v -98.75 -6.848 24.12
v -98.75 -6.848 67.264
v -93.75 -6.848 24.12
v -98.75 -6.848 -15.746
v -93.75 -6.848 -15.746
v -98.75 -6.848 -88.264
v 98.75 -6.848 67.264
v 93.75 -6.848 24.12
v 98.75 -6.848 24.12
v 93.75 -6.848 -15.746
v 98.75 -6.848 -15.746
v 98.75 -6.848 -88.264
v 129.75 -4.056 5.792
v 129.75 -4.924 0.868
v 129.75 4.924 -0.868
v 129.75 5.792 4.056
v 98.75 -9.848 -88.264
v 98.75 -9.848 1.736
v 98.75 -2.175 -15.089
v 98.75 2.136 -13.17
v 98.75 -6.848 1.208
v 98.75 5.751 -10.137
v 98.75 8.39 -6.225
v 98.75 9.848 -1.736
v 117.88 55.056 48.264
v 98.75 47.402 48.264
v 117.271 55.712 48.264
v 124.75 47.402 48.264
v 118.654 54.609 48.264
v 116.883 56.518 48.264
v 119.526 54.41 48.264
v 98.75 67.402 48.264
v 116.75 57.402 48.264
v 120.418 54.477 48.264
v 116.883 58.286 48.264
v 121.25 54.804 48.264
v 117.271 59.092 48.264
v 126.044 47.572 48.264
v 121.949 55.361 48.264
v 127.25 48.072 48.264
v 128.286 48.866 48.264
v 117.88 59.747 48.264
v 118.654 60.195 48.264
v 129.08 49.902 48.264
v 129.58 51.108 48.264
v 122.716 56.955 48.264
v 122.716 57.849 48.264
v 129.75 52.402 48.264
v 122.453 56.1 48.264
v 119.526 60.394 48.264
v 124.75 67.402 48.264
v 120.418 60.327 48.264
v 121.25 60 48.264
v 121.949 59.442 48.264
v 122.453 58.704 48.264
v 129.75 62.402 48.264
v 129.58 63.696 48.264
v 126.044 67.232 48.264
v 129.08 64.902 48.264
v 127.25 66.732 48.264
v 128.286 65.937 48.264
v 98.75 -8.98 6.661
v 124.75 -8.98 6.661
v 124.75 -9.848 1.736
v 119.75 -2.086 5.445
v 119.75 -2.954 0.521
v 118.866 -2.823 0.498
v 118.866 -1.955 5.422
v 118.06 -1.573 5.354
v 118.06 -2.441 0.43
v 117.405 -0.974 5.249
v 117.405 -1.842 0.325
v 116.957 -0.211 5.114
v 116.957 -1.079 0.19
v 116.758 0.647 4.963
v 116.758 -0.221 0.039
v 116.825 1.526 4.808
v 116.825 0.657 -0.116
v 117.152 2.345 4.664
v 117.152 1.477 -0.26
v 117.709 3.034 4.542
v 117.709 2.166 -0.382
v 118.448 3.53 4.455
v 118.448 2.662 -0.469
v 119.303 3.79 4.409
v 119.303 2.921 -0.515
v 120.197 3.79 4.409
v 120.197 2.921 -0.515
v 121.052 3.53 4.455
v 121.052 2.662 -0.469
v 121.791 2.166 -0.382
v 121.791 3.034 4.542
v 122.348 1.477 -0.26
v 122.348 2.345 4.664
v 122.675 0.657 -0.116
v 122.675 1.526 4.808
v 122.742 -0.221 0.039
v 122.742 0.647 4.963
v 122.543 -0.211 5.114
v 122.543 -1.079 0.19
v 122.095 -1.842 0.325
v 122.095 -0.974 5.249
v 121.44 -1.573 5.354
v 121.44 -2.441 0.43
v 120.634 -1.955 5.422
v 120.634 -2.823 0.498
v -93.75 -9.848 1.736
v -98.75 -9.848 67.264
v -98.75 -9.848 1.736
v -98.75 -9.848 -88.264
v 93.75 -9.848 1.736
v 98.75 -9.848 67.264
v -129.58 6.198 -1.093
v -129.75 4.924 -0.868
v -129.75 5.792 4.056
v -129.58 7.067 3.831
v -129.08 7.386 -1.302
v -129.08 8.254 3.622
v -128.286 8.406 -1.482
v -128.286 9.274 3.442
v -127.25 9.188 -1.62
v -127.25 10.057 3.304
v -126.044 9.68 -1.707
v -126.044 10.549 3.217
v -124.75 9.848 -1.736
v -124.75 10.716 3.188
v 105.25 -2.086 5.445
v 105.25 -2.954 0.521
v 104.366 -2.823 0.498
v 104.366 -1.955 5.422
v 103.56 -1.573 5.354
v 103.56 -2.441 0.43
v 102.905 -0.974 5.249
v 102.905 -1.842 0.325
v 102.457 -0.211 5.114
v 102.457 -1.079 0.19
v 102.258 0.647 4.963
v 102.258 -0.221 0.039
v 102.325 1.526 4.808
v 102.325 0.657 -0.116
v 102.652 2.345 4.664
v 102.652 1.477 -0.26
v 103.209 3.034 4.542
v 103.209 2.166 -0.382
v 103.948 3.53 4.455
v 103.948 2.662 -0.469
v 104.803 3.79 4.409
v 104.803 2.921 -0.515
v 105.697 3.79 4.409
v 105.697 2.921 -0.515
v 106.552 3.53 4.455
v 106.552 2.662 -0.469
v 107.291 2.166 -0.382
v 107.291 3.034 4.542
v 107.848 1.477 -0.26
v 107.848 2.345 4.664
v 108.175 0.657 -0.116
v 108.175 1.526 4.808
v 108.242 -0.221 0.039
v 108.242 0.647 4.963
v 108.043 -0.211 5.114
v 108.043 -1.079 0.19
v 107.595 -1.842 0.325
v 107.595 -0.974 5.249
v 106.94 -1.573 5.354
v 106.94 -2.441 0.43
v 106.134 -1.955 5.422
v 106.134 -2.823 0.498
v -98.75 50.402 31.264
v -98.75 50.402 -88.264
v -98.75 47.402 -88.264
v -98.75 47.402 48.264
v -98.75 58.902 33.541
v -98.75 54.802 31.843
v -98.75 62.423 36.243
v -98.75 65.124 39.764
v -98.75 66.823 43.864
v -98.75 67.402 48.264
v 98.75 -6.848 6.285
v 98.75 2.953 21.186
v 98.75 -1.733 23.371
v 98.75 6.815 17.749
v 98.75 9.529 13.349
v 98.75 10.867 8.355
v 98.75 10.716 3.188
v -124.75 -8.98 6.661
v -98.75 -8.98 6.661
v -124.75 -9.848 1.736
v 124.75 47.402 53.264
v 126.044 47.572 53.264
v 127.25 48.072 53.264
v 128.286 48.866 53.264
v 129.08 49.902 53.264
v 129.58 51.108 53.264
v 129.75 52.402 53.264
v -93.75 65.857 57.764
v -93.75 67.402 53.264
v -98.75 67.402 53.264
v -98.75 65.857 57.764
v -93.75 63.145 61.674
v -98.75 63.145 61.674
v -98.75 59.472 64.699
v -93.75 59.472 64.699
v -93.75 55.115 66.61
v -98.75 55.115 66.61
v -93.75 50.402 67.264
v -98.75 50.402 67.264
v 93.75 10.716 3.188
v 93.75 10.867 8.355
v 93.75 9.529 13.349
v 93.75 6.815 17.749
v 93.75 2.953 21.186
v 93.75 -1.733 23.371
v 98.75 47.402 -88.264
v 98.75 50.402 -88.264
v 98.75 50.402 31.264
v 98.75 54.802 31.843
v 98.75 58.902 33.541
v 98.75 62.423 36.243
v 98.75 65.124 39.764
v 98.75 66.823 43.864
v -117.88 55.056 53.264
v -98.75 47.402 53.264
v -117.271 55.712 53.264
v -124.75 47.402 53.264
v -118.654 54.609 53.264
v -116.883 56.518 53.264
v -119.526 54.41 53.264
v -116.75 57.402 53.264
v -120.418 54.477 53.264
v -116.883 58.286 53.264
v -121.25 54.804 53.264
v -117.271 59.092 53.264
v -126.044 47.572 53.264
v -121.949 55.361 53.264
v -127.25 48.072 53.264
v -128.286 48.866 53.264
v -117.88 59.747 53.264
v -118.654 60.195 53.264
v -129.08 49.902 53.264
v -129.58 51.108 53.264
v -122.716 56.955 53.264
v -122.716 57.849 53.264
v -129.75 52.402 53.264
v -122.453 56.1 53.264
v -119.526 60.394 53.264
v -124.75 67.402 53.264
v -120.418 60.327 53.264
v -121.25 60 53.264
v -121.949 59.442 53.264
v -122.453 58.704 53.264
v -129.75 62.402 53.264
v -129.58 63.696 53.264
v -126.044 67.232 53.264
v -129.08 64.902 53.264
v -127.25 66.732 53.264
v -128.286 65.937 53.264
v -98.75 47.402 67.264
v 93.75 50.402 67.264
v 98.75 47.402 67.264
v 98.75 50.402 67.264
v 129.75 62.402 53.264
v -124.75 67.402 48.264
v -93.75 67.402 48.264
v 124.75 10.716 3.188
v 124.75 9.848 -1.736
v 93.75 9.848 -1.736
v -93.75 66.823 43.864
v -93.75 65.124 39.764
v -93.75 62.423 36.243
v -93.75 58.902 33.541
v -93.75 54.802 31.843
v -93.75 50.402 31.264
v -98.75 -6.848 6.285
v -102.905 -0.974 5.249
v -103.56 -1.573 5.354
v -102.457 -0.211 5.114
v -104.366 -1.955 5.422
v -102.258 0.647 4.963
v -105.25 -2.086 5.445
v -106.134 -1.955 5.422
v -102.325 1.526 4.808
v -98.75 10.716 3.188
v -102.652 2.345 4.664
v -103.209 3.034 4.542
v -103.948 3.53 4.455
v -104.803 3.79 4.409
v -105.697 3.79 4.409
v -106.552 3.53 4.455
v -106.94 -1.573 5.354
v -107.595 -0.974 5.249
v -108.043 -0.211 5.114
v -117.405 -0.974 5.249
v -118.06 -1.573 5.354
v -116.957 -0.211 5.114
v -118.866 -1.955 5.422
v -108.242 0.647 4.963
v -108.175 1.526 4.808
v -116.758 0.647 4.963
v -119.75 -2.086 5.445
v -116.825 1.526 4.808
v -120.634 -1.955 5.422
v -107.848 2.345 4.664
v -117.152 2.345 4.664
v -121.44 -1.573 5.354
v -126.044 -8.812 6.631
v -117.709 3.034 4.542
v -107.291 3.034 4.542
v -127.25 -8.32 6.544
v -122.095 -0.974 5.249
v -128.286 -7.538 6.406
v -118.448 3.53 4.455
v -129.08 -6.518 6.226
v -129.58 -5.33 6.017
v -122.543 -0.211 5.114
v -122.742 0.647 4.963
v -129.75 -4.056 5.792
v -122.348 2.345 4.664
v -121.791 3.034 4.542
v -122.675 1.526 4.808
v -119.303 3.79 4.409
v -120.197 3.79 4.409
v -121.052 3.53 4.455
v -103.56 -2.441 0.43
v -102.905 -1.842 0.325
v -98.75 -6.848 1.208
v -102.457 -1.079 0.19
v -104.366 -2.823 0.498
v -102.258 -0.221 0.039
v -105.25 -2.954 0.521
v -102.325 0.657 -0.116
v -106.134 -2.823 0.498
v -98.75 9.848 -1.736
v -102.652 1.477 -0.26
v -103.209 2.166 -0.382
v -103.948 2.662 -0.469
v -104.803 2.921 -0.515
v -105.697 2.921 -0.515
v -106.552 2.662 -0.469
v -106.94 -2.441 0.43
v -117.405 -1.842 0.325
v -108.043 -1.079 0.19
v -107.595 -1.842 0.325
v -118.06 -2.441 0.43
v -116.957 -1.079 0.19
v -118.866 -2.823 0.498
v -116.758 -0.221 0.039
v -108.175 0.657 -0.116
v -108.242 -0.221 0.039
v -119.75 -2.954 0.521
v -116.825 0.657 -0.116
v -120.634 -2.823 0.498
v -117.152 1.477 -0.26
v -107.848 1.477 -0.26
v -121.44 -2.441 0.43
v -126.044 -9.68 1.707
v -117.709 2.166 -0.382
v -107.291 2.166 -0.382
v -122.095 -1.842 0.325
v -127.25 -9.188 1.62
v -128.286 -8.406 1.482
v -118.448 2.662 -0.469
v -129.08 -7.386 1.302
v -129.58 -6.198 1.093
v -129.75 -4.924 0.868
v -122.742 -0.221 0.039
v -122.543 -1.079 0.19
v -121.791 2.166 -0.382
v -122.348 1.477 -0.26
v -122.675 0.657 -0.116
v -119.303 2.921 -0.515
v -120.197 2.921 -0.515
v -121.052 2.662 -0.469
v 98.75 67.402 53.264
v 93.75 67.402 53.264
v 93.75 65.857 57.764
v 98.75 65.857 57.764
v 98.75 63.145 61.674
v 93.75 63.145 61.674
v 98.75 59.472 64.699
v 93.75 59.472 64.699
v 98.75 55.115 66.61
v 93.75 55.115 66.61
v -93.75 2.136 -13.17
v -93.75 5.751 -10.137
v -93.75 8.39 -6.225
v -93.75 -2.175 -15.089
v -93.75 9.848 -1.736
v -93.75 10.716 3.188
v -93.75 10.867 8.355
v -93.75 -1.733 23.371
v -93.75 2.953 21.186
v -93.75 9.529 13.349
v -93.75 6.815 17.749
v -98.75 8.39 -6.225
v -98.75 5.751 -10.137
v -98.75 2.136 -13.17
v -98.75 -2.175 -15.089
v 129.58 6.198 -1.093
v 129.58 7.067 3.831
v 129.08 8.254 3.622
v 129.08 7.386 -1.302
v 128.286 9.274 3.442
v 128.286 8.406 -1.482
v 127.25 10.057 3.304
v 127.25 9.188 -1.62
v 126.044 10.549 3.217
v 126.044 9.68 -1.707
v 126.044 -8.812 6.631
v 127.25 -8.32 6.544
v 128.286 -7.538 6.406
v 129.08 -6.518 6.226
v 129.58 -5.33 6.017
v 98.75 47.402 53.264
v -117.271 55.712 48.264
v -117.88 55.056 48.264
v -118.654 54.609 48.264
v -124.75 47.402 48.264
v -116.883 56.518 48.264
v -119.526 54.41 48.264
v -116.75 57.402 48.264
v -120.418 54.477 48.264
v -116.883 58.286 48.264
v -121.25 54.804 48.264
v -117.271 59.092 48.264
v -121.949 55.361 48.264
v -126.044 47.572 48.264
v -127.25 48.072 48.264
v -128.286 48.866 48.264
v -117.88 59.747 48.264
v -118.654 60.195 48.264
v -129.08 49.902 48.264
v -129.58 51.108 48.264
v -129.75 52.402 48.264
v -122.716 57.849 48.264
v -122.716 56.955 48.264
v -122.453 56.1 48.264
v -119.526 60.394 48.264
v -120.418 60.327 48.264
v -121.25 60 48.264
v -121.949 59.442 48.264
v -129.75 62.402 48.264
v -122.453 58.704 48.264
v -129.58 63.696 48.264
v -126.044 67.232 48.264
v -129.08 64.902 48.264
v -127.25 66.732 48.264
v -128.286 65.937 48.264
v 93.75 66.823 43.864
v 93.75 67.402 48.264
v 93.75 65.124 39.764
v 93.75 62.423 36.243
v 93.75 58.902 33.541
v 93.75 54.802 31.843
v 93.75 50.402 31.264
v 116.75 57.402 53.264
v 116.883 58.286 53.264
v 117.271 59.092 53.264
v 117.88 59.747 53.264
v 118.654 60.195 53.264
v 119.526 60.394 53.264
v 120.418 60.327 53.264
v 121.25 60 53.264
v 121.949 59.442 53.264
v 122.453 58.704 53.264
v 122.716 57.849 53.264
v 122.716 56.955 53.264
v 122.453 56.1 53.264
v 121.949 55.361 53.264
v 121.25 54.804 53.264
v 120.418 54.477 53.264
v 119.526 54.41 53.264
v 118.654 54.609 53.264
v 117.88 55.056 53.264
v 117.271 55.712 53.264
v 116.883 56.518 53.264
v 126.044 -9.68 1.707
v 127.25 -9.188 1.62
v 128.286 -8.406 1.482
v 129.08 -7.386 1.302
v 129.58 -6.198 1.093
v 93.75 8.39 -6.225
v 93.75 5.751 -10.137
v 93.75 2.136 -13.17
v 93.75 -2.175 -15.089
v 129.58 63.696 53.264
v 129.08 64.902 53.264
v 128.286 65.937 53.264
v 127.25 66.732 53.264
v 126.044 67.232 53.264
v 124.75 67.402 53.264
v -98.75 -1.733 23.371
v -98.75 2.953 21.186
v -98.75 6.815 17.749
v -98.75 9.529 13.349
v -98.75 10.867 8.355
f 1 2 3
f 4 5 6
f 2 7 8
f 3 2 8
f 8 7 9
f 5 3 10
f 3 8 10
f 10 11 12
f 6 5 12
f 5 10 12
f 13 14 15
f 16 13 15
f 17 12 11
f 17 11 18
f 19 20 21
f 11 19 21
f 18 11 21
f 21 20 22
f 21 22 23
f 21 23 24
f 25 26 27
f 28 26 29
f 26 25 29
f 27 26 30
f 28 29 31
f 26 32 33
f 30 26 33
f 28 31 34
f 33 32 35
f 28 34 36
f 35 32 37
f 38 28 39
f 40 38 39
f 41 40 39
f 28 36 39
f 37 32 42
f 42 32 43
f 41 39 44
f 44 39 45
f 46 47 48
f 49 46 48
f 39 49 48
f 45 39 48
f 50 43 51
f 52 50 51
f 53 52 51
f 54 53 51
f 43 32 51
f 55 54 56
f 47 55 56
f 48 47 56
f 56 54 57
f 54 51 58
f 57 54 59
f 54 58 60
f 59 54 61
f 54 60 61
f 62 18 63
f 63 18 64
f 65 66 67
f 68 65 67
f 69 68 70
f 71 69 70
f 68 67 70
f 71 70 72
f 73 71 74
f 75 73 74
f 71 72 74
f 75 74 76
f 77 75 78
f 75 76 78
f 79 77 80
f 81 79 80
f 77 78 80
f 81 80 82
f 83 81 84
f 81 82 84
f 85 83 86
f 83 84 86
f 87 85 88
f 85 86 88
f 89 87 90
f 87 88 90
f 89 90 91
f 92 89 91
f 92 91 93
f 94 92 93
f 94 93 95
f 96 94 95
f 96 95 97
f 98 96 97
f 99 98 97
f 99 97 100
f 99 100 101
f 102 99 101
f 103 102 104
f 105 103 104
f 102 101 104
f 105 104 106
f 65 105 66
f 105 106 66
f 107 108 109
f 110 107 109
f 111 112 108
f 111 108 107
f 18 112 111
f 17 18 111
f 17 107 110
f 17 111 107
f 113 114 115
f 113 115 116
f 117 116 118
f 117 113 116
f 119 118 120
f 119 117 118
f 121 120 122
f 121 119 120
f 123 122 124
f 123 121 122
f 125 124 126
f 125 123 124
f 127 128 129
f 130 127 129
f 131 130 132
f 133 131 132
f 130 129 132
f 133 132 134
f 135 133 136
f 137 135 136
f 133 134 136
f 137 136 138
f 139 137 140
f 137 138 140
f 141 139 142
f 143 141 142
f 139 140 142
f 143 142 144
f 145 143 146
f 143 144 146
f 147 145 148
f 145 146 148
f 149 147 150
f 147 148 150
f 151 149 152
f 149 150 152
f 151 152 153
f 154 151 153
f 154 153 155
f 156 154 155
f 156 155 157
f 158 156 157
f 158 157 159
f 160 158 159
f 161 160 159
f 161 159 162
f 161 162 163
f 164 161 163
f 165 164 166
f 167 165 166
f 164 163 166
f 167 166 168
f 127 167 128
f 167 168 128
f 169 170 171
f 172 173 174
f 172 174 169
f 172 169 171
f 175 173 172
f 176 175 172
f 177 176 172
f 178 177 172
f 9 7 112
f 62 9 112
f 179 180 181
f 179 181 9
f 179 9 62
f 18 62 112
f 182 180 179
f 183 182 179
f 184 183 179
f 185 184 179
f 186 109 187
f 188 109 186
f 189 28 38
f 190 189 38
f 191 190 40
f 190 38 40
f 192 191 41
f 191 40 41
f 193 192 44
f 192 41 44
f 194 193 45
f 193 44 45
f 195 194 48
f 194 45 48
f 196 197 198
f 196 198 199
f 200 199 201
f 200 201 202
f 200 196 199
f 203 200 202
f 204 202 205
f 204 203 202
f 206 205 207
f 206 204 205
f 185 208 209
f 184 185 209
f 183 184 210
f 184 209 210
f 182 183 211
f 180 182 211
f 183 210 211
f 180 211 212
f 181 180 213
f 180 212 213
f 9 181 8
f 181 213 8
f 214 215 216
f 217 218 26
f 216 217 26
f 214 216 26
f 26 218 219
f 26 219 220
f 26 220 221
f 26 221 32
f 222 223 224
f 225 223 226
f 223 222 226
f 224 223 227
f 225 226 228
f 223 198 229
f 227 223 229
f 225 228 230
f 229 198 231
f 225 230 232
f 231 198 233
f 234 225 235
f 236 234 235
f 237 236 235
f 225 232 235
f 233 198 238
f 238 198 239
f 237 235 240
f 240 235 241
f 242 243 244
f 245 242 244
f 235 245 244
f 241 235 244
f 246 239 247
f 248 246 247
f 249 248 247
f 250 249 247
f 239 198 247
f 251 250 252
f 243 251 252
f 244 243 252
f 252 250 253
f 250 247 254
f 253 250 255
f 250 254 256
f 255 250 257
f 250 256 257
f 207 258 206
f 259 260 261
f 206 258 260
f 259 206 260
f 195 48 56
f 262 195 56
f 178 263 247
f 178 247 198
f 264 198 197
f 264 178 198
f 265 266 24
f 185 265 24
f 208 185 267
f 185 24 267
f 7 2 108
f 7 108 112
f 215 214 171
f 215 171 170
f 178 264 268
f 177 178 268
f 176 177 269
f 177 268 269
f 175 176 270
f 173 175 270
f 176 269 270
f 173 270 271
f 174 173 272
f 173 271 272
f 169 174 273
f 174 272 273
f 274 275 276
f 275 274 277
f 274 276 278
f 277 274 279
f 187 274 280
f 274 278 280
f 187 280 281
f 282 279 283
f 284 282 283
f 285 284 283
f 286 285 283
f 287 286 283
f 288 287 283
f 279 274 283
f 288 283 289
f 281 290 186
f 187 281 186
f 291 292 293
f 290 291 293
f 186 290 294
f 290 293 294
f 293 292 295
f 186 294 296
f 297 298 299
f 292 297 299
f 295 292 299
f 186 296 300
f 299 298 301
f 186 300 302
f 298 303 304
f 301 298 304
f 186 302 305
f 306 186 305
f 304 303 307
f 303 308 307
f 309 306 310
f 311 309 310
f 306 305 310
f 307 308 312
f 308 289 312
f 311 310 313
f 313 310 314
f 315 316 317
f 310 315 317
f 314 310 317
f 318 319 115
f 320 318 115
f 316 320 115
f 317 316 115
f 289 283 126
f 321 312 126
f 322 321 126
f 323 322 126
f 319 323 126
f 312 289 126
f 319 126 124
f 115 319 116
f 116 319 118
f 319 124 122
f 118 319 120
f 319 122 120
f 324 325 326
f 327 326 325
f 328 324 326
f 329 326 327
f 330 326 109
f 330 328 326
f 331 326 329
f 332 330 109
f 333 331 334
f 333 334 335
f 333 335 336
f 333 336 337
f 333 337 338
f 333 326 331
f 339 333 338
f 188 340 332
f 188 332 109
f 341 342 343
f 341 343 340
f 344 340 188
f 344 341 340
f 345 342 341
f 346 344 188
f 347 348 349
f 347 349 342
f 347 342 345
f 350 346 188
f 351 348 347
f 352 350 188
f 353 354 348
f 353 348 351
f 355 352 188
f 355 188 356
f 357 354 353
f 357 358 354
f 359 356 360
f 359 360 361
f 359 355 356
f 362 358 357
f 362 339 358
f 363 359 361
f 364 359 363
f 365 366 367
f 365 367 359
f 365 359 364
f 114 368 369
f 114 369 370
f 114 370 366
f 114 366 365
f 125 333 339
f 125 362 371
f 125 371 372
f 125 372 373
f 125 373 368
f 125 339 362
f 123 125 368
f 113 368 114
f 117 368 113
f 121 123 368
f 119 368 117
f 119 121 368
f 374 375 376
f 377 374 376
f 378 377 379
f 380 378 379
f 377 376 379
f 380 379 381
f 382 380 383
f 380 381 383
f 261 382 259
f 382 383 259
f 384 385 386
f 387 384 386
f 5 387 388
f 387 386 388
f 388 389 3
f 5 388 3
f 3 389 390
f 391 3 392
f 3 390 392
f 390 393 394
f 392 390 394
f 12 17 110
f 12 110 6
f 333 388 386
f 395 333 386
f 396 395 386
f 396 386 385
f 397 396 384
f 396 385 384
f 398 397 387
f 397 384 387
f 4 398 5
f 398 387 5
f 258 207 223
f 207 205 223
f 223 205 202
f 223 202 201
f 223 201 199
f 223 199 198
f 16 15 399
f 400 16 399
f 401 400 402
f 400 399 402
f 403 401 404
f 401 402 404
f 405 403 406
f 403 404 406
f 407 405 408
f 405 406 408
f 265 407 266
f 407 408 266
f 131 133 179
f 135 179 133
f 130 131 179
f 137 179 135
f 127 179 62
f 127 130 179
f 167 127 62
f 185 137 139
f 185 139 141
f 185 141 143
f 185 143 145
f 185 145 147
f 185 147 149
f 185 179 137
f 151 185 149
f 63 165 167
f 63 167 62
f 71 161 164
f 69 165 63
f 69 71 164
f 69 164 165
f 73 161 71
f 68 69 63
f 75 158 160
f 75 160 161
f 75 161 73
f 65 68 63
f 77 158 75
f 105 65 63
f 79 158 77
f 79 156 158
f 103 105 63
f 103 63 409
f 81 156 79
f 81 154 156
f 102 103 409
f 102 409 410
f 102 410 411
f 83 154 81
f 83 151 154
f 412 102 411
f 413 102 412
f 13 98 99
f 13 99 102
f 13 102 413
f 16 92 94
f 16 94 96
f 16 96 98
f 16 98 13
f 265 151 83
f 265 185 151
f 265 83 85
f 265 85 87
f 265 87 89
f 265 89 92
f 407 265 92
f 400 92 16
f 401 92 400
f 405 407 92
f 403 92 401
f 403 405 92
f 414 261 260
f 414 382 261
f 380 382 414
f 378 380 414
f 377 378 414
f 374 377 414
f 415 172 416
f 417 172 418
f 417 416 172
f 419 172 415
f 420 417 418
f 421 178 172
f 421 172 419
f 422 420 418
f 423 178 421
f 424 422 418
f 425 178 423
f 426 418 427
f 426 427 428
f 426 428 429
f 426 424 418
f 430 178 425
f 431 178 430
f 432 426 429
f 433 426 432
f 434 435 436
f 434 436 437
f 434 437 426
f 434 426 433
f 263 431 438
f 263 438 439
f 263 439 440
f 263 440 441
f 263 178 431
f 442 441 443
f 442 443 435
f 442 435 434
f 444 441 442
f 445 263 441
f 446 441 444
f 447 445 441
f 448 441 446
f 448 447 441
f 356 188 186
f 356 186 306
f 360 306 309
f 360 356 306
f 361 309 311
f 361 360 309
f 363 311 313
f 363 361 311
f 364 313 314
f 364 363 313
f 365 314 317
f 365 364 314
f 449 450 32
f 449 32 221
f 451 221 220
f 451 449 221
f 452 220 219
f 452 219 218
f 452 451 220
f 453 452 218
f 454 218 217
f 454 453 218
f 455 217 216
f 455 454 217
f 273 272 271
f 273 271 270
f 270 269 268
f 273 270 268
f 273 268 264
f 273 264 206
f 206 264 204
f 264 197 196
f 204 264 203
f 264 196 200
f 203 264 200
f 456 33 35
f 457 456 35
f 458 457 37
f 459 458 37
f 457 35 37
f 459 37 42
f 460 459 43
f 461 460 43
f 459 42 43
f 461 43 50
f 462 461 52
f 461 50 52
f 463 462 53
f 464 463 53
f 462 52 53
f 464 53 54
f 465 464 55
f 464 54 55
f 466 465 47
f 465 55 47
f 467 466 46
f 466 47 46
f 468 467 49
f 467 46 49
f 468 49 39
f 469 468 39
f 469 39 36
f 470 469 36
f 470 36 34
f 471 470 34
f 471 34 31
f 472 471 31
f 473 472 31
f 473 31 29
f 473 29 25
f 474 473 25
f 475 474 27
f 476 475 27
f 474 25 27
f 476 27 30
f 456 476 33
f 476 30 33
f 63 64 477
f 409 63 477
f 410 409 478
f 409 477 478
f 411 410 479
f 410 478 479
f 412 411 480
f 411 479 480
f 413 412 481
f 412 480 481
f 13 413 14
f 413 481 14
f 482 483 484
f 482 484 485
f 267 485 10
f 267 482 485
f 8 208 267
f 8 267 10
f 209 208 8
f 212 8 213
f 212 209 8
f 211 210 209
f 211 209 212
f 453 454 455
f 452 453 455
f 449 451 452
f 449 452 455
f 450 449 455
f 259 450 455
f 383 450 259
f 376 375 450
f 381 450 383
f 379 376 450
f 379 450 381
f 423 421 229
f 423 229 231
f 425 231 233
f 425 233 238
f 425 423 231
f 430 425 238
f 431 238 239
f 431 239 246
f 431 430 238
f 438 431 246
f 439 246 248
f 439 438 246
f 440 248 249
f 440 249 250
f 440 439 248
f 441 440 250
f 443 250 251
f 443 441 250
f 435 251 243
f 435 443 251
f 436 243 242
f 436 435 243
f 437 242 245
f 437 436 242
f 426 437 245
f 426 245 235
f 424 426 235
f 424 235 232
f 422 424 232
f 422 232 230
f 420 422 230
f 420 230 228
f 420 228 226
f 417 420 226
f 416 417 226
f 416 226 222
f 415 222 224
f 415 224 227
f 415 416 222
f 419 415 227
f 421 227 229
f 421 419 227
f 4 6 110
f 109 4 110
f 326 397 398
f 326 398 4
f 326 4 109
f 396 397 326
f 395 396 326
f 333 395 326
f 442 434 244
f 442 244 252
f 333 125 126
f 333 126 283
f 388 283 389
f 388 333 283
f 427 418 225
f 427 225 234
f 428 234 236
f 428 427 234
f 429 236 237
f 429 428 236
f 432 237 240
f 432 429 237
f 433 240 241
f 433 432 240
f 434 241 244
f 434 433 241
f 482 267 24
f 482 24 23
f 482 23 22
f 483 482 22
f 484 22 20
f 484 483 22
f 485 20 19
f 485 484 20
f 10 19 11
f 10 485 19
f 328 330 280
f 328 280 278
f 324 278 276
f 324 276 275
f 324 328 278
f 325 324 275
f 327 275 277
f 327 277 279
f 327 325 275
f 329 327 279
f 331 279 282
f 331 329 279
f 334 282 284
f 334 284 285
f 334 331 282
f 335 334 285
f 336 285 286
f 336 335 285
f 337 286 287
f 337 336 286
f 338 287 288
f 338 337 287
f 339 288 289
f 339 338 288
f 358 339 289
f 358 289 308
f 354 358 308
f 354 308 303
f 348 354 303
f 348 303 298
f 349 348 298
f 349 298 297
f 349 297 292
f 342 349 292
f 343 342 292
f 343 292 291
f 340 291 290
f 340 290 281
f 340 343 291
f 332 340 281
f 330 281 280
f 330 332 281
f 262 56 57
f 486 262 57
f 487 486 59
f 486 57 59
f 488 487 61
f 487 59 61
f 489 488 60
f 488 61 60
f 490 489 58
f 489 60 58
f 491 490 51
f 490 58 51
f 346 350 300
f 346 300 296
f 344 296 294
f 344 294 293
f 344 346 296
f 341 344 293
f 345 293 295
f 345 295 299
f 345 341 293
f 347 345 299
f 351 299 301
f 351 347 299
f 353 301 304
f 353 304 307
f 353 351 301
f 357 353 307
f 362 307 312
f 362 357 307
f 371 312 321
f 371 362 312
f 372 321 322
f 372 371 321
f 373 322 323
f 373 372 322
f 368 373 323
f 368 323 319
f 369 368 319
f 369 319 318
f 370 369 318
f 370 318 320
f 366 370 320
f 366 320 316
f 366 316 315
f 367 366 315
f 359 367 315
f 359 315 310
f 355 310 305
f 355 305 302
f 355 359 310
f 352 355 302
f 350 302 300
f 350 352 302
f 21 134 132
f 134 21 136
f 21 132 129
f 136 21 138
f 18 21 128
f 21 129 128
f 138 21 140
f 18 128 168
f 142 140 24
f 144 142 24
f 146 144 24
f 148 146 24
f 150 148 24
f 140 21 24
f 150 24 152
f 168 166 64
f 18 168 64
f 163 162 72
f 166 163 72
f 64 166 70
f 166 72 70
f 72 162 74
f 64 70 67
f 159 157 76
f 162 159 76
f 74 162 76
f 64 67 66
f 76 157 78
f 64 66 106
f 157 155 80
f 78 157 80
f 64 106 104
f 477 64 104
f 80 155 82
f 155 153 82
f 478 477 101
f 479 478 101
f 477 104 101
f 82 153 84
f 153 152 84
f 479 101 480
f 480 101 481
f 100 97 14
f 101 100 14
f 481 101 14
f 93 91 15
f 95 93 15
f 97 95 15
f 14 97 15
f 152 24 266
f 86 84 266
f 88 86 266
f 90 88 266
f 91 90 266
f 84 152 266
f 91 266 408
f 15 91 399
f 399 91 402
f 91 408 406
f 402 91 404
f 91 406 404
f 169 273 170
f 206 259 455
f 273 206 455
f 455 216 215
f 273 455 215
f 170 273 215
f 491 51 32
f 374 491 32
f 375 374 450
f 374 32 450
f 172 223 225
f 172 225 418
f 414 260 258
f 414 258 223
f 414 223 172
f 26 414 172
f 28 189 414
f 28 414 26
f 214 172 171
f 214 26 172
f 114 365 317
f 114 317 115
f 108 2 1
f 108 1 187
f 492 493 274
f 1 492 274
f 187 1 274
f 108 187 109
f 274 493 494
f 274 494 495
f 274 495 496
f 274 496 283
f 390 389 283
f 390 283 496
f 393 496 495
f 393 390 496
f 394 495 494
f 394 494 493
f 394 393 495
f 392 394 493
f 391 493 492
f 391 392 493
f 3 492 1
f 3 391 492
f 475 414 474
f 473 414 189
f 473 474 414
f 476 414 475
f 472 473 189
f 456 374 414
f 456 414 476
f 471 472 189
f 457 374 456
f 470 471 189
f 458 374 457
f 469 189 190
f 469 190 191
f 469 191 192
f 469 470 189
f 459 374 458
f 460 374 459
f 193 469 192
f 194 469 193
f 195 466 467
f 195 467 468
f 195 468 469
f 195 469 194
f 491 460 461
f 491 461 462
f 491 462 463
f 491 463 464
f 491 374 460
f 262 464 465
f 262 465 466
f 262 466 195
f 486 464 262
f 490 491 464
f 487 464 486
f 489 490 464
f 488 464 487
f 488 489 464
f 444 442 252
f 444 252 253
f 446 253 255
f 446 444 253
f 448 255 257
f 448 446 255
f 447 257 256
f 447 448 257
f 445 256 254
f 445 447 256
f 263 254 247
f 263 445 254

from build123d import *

# Parameters (mm, degrees)
SKETCH1_R                        = 3
LOWER_LEFT_TAB_DEPTH             = 5
BOTTOM_START                     = -5
SKETCH2_W                        = 157
SKETCH2_H                        = 3
BOTTOM_PLATE_EXTRUDE_DEPTH       = 98.75
BOTTOM_TAB_SUPPORT_EXTRUDE_DEPTH = 5
SKETCH5_R                        = 3
TOP_TAB_EXTRUDE_DEPTH            = 5
TOP_START                        = -5
SKETCH6_W                        = 155.527036446
SKETCH6_H                        = 3
TOP_PLATE_EXTRUDE_DEPTH          = 98.75
TOP_TAB_SUPPORT_EXTRUDE_DEPTH    = 5
SKETCH8_W                        = 197.5
SKETCH8_H                        = 1.472963554
BOTTOM_PLATE_WAS_TOO_LONG_DEPTH  = 10


with BuildPart() as part:
    # Sketch1 → Lower left tab (new body)
    with BuildSketch(Plane(origin=(0, 0, 0), x_dir=(1, 0, 0), z_dir=(0, 0.17364817766693072, 0.984807753012208))):
        with BuildLine():
            Line((-124.75, 10), (-93.75, 10))
            Line((-93.75, 10), (-93.75, -10))
            Line((-93.75, -10), (-124.75, -10))
            ThreePointArc((-124.75, -10), (-128.285533906, -8.535533906), (-129.75, -5))
            Line((-129.75, -5), (-129.75, 5))
            ThreePointArc((-129.75, 5), (-128.285533906, 8.535533906), (-124.75, 10))
        make_face()
        with Locations(Location((-119.75, 0, 0), (0, 0, 270))):
            Circle(SKETCH1_R, mode=Mode.SUBTRACT)
        with Locations(Location((-105.25, 0, 0), (0, 0, 270))):
            Circle(SKETCH1_R, mode=Mode.SUBTRACT)
    lower_left_tab = extrude(amount=LOWER_LEFT_TAB_DEPTH)

    # Sketch2 → Bottom plate extrude (add)
    with BuildSketch(Plane(origin=(-93.75, 0, 0), x_dir=(0, 0, -1), z_dir=(1, 0, 0)).offset(BOTTOM_START)):
        with Locations((9.763518223, -8.34807753)):
            Rectangle(SKETCH2_W, SKETCH2_H)
    bottom_plate_extrude = extrude(amount=BOTTOM_PLATE_EXTRUDE_DEPTH)

    # Sketch4 → Bottom tab support extrude (add)
    with BuildSketch(Plane(origin=(-93.75, 0, 0), x_dir=(0, 0, -1), z_dir=(1, 0, 0))):
        with BuildLine():
            Line((15.74621933, -6.84807753), (-1.207500835, -6.84807753))
            Line((-1.207500835, -6.84807753), (1.736481777, 9.84807753))
            ThreePointArc((1.736481777, 9.84807753), (11.779802288, 4.04956373), (15.74621933, -6.84807753))
        make_face()
        with BuildLine():
            Line((-6.284633894, -6.84807753), (-3.187556988, 10.716318418))
            ThreePointArc((-3.187556988, 10.716318418), (-17.748979146, 6.814597111), (-24.119988962, -6.84807753))
            Line((-24.119988962, -6.84807753), (-6.284633894, -6.84807753))
        make_face()
    bottom_tab_support_extrude = extrude(amount=-BOTTOM_TAB_SUPPORT_EXTRUDE_DEPTH)


with BuildPart() as body_2:
    # Sketch5 → Top tab extrude (new body)
    with BuildSketch(Plane.XY.offset(48.263518223)):
        with BuildLine():
            Line((-124.75, 67.40192247), (-93.75, 67.40192247))
            Line((-93.75, 67.40192247), (-93.75, 47.40192247))
            Line((-93.75, 47.40192247), (-124.75, 47.40192247))
            ThreePointArc((-124.75, 47.40192247), (-128.285533906, 48.866388564), (-129.75, 52.40192247))
            Line((-129.75, 52.40192247), (-129.75, 62.40192247))
            ThreePointArc((-129.75, 62.40192247), (-128.285533906, 65.937456376), (-124.75, 67.40192247))
        make_face()
        with Locations((-119.75, 57.40192247)):
            Circle(SKETCH5_R, mode=Mode.SUBTRACT)
    top_tab_extrude = extrude(amount=TOP_TAB_EXTRUDE_DEPTH)

    # Sketch6 → Top plate extrude (add)
    with BuildSketch(Plane(origin=(-93.75, 0, 0), x_dir=(0, 0, -1), z_dir=(1, 0, 0)).offset(TOP_START)):
        with Locations((10.5, 48.90192247)):
            Rectangle(SKETCH6_W, SKETCH6_H)
    top_plate_extrude = extrude(amount=TOP_PLATE_EXTRUDE_DEPTH)

    # Sketch7 → Top tab support extrude (add)
    with BuildSketch(Plane(origin=(-93.75, 0, 0), x_dir=(0, 0, -1), z_dir=(1, 0, 0))):
        with BuildLine():
            Line((-48.263518223, 50.40192247), (-48.263518223, 67.40192247))
            ThreePointArc((-48.263518223, 67.40192247), (-36.242702943, 62.42273775), (-31.263518223, 50.40192247))
            Line((-31.263518223, 50.40192247), (-48.263518223, 50.40192247))
        make_face()
        with BuildLine():
            Line((-53.263518223, 50.40192247), (-53.263518223, 67.40192247))
            ThreePointArc((-53.263518223, 67.40192247), (-63.31302409, 61.413280243), (-67.263518223, 50.40192247))
            Line((-67.263518223, 50.40192247), (-53.263518223, 50.40192247))
        make_face()
    top_tab_support_extrude = extrude(amount=-TOP_TAB_SUPPORT_EXTRUDE_DEPTH)


with BuildPart() as part_1:
    add(part.part)

    add(body_2.part)  # Mirror 2 merges body 2
    # Mirror 2: Lower left tab, Bottom plate extrude, Bottom tab support extrude, Top tab extrude, Top plate extrude, Top tab support extrude across plane
    add(lower_left_tab.mirror(Plane(origin=(0, 0, 0), x_dir=(0, 0, 1), z_dir=(1, 0, 0))))
    add(bottom_plate_extrude.mirror(Plane(origin=(0, 0, 0), x_dir=(0, 0, 1), z_dir=(1, 0, 0))))
    add(bottom_tab_support_extrude.mirror(Plane(origin=(0, 0, 0), x_dir=(0, 0, 1), z_dir=(1, 0, 0))))
    add(top_tab_extrude.mirror(Plane(origin=(0, 0, 0), x_dir=(0, 0, 1), z_dir=(1, 0, 0))))
    add(top_plate_extrude.mirror(Plane(origin=(0, 0, 0), x_dir=(0, 0, 1), z_dir=(1, 0, 0))))
    add(top_tab_support_extrude.mirror(Plane(origin=(0, 0, 0), x_dir=(0, 0, 1), z_dir=(1, 0, 0))))

    # Sketch8 → Bottom plate was too long (cut)
    with BuildSketch(Plane(origin=(0, -6.84807753, 0), x_dir=(1, 0, 0), z_dir=(0, 1, 0))):
        with Locations((0, -68)):
            Rectangle(SKETCH8_W, SKETCH8_H)
    extrude(amount=-BOTTOM_PLATE_WAS_TOO_LONG_DEPTH, mode=Mode.SUBTRACT)


solid = part_1.part
